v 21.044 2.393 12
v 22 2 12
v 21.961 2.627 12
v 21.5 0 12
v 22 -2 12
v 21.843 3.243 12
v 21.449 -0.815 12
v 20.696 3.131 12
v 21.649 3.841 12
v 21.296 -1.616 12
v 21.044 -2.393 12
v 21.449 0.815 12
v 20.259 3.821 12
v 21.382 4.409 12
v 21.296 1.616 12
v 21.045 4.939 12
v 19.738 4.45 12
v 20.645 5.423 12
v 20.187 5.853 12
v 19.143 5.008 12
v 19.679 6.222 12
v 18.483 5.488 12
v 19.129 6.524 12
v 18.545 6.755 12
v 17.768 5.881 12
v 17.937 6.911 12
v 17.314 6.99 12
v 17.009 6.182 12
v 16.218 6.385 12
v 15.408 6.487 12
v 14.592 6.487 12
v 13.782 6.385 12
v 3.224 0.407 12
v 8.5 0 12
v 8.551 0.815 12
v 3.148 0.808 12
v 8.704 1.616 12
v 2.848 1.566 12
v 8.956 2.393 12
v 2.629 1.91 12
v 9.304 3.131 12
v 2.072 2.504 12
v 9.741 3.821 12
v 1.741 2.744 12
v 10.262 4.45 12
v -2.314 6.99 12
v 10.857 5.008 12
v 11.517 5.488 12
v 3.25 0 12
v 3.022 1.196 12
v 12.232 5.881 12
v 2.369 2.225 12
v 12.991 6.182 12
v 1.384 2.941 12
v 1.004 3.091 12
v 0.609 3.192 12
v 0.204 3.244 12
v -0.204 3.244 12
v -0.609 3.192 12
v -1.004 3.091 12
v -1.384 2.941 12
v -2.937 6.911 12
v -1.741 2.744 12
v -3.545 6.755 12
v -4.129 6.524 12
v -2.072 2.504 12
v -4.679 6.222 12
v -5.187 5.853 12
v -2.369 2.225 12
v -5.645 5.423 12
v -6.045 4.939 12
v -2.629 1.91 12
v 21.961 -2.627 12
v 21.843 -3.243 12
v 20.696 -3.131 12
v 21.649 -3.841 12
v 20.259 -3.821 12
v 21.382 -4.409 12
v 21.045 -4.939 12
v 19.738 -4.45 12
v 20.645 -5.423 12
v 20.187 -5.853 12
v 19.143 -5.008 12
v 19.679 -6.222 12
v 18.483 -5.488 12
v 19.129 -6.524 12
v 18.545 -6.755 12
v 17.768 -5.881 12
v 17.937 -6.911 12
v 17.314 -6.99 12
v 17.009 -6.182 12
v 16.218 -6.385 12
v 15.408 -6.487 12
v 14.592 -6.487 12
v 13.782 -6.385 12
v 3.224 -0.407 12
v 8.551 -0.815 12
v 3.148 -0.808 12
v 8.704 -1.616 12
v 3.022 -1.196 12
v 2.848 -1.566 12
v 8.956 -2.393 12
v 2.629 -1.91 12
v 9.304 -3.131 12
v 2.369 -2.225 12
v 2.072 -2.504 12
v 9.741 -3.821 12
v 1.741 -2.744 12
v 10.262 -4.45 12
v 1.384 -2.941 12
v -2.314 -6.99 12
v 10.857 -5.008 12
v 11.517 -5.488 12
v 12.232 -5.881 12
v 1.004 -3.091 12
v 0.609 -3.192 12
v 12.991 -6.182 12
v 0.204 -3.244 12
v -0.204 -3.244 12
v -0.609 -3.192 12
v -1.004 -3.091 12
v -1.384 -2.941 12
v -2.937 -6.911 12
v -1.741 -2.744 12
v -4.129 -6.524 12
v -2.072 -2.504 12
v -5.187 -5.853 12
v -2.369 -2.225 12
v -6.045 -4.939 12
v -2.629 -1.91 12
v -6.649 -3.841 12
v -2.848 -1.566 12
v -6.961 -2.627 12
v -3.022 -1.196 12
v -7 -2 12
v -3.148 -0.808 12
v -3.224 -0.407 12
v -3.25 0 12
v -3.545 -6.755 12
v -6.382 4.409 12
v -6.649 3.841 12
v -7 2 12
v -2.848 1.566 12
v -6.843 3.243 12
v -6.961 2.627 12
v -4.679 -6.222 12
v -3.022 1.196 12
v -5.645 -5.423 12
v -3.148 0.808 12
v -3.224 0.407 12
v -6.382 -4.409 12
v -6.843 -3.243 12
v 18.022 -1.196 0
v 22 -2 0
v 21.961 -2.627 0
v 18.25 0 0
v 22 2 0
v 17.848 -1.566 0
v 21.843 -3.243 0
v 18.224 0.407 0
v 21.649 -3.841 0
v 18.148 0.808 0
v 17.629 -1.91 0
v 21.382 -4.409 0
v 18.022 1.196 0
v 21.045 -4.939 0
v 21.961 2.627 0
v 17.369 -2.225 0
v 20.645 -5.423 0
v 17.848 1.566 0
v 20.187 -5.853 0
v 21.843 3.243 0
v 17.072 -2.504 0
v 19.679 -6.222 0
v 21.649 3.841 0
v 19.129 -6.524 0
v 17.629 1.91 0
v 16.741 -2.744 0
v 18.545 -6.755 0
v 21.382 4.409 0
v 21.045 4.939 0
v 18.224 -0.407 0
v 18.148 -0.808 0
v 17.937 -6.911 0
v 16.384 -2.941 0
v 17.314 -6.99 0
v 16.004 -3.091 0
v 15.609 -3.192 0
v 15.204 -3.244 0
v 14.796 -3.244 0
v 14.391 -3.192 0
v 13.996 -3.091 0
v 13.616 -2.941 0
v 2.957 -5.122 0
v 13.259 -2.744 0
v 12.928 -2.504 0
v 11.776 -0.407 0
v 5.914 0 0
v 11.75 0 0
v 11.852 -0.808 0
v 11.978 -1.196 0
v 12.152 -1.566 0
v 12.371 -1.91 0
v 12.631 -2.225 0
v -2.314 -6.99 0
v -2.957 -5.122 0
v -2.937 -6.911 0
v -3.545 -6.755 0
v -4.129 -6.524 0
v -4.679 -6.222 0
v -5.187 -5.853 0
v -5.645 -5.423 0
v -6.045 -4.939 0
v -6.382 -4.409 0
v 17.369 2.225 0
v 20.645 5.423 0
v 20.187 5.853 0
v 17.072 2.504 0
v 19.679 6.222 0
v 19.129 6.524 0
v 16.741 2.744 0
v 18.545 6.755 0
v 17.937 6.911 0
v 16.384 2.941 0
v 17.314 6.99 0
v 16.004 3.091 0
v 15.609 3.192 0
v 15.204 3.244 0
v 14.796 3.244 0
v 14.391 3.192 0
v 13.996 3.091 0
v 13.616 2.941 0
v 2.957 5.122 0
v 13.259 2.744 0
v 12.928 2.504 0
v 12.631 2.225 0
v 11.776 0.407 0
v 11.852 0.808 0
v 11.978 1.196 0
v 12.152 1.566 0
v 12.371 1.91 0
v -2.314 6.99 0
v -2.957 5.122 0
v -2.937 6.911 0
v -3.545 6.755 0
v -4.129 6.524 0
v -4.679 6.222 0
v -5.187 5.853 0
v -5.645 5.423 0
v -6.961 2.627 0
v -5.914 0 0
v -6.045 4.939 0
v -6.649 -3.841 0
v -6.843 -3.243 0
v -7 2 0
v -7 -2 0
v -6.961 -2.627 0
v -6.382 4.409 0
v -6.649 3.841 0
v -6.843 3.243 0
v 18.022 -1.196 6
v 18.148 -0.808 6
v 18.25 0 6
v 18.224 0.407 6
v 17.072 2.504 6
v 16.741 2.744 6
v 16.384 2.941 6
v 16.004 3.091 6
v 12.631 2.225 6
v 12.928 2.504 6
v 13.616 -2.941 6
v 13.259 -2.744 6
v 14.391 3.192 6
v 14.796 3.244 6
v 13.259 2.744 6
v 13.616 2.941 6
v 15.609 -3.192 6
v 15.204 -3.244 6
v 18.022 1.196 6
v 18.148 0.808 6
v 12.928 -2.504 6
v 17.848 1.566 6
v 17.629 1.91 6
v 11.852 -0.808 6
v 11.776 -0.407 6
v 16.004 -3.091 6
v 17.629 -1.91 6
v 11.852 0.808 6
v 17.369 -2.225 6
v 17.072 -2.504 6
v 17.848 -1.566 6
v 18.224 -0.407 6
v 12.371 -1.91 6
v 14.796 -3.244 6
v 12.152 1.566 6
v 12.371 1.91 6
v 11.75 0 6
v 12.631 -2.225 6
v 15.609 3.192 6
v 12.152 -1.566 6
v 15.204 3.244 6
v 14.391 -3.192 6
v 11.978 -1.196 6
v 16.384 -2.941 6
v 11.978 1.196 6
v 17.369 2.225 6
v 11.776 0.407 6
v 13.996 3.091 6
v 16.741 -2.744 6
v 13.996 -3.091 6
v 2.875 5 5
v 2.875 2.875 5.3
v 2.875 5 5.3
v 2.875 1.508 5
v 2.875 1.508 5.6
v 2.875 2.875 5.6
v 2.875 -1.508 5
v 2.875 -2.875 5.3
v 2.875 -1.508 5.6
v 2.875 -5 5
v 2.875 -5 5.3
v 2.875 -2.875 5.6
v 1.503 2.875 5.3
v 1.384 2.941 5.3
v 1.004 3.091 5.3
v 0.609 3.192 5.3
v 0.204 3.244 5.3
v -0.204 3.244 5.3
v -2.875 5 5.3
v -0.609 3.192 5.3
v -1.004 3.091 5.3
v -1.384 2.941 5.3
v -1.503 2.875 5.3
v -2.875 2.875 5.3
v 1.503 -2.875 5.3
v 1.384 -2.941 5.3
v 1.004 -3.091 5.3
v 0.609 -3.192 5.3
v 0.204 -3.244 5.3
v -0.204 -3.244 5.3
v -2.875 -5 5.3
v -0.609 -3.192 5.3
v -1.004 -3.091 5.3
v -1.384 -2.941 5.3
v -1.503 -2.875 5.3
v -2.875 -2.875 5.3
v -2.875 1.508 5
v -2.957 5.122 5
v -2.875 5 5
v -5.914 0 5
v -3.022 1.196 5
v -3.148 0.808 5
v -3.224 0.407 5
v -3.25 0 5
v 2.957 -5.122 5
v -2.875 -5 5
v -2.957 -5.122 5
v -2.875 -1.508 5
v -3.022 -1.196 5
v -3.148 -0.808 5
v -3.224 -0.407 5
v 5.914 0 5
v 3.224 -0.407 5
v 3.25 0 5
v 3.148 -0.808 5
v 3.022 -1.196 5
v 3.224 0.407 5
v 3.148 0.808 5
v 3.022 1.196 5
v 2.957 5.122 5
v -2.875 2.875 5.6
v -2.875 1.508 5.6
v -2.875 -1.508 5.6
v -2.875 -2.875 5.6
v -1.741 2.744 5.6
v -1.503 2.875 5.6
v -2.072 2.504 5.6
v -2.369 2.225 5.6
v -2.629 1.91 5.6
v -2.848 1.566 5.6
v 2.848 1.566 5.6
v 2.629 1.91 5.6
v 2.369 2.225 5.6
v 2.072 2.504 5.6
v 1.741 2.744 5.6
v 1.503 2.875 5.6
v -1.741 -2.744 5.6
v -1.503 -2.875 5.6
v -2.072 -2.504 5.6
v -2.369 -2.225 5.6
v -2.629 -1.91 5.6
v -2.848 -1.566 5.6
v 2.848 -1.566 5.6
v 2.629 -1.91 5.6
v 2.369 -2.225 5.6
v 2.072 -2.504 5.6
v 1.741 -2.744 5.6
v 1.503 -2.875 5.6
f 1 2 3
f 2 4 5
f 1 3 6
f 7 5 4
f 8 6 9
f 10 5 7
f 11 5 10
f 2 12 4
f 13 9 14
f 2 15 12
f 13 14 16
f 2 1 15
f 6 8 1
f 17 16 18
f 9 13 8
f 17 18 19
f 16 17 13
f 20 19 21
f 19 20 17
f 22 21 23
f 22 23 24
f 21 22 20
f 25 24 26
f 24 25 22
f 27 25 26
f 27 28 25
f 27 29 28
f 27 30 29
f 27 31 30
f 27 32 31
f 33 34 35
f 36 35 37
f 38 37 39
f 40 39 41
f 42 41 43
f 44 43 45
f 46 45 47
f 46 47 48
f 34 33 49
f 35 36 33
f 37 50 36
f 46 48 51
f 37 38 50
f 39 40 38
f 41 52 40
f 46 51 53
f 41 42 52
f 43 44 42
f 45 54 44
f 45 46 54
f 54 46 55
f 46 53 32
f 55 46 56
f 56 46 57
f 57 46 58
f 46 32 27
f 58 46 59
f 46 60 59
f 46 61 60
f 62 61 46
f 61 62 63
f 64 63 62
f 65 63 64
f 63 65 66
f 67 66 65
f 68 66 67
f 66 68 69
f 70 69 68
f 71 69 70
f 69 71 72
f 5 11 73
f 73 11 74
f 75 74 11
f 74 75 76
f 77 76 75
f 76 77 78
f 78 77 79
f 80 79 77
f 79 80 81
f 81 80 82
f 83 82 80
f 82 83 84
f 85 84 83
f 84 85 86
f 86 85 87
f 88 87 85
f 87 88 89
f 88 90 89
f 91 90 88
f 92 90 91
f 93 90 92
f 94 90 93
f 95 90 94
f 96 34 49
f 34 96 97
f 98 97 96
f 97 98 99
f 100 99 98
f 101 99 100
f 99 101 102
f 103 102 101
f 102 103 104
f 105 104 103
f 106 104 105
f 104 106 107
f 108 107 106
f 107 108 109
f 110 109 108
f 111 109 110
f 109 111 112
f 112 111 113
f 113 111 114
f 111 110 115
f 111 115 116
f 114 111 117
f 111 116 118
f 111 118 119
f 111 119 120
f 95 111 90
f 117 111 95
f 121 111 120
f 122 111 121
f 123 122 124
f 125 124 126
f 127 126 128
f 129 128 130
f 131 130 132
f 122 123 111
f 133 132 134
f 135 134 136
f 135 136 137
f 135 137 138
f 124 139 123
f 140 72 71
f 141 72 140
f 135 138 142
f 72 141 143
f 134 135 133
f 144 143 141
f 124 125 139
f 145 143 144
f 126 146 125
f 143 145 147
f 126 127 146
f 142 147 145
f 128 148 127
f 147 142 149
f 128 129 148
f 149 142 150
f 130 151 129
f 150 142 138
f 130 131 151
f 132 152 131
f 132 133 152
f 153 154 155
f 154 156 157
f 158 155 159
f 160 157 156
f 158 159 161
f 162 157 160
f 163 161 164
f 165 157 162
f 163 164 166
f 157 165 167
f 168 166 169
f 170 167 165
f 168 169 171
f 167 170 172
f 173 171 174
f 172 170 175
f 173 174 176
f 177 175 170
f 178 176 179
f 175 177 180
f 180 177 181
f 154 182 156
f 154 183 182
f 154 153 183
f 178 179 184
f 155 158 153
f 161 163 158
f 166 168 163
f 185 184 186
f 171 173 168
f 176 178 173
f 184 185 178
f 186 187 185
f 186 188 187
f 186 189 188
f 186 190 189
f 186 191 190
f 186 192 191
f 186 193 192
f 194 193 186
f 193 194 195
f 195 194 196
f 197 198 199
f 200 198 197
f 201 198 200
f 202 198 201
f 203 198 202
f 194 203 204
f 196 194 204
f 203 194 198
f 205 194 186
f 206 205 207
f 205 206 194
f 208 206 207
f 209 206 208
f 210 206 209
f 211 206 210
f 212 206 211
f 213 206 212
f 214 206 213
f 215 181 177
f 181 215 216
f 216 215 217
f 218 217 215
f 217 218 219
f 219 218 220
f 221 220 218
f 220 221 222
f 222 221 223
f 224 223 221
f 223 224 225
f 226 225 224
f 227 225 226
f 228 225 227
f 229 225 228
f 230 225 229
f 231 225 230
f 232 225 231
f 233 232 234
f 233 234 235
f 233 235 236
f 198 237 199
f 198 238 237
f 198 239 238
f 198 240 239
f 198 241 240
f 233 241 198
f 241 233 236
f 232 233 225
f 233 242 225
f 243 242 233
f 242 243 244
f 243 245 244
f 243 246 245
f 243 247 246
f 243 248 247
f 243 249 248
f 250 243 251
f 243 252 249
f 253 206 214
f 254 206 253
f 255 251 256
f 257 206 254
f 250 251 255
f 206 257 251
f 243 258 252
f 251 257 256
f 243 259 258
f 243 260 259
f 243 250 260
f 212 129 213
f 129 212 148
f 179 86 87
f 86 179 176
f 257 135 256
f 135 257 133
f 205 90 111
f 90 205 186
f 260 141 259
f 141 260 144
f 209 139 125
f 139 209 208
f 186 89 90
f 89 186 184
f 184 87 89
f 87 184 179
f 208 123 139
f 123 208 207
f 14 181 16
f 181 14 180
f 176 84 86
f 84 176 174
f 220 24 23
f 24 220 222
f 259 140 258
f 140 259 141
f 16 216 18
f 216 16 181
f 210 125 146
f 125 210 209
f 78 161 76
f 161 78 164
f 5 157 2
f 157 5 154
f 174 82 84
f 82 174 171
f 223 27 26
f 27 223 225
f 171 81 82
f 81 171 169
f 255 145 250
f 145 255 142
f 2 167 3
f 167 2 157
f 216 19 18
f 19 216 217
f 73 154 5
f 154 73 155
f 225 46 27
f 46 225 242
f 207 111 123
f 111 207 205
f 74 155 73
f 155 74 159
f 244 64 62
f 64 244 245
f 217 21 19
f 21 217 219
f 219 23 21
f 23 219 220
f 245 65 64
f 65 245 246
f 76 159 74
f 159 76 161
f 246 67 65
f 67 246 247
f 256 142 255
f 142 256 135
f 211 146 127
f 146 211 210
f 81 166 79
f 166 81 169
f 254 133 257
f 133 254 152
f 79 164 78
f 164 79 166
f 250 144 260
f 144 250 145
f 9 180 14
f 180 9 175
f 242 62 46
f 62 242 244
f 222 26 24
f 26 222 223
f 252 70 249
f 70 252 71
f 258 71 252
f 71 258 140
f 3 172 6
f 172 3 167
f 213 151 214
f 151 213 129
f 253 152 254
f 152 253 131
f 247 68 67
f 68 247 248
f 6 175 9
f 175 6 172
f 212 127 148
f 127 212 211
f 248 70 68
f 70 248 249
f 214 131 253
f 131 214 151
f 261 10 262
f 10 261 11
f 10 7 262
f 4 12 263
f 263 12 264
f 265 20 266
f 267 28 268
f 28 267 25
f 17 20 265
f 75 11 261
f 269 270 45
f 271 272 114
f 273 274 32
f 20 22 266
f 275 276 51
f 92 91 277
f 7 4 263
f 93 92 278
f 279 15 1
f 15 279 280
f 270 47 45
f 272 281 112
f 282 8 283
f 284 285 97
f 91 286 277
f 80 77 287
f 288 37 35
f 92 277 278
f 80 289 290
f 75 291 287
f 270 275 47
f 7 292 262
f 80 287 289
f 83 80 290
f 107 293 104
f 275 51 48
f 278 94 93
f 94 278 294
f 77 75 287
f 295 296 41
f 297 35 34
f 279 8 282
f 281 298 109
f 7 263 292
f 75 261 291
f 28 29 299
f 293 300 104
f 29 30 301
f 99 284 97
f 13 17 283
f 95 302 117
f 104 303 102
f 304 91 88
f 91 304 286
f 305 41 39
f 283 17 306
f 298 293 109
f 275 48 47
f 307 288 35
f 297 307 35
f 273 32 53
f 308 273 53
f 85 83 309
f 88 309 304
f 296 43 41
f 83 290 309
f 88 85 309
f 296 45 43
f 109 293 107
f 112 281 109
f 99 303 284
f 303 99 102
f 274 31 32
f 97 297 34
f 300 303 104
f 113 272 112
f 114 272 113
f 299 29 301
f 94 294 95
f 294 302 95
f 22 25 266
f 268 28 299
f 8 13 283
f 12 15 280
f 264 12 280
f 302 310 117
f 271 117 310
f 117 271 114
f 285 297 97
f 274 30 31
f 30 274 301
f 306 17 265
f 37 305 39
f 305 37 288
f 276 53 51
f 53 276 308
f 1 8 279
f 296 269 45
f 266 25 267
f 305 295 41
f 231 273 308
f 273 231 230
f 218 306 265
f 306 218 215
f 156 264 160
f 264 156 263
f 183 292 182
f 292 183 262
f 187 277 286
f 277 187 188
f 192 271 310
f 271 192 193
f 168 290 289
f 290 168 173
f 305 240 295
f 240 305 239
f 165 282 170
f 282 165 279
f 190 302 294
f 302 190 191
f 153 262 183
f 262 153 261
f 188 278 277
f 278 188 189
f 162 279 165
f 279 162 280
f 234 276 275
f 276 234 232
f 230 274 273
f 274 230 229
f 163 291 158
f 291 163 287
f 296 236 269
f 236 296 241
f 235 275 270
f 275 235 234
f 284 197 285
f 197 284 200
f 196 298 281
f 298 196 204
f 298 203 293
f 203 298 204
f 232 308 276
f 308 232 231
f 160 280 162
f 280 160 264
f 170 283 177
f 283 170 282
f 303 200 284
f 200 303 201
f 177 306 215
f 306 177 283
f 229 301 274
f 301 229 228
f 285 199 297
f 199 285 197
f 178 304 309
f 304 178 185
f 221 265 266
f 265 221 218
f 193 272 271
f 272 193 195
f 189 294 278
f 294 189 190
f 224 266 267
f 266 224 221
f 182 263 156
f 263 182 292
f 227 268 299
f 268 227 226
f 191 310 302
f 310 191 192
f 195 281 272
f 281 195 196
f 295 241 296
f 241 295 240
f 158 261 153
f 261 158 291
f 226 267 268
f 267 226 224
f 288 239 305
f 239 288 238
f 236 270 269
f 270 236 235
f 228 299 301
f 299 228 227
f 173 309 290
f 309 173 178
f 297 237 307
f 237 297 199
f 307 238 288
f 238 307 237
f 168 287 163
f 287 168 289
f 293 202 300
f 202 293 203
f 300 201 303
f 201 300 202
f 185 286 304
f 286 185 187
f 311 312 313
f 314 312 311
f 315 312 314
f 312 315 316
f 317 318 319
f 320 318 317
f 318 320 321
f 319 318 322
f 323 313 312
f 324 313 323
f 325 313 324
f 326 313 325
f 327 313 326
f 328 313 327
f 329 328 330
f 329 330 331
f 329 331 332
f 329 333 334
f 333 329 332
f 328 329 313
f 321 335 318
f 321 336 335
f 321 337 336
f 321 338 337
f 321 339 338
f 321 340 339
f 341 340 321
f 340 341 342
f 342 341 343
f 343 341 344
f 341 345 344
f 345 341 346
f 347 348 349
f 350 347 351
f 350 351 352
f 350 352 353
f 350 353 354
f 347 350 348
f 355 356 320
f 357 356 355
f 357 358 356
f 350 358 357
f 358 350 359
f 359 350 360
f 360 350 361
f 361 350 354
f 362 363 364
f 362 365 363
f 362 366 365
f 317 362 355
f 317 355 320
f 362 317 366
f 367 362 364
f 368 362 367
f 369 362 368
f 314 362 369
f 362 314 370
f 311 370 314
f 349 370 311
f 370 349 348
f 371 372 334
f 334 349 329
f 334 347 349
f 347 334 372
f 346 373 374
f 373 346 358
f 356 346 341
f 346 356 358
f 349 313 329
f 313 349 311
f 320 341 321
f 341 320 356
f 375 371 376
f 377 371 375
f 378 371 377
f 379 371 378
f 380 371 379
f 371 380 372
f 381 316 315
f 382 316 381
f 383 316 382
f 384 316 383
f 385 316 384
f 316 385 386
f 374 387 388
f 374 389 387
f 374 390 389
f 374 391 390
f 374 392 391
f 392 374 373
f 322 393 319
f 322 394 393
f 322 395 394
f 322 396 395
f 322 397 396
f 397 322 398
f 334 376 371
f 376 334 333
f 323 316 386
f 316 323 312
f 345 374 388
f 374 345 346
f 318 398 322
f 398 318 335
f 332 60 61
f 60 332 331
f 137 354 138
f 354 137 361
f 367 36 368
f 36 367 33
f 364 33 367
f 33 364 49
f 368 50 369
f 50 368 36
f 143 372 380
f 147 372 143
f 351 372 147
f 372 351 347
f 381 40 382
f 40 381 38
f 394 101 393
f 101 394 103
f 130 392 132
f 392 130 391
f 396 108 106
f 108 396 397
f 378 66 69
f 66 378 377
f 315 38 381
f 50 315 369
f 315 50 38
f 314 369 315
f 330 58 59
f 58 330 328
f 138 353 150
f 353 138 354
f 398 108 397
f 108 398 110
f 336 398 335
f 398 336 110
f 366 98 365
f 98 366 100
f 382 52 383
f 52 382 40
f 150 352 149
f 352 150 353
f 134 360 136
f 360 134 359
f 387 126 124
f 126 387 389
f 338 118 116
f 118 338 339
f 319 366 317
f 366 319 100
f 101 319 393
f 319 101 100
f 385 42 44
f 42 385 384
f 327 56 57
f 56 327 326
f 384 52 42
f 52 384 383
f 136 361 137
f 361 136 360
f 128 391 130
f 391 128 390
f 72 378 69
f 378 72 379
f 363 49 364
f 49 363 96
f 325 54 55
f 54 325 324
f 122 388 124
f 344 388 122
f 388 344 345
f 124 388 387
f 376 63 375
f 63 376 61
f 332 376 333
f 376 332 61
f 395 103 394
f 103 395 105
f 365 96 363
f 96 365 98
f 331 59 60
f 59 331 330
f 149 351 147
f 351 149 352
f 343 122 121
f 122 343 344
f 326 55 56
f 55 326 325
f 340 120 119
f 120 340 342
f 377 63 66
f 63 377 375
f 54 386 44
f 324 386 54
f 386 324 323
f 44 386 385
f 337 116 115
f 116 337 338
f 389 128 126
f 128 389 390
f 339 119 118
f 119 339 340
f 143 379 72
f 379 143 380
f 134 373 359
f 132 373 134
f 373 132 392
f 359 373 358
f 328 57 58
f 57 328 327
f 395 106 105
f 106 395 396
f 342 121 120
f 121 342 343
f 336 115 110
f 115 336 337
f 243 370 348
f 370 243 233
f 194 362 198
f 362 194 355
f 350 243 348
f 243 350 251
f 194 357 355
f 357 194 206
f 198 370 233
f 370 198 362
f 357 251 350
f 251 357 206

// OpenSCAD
$fn = 50;


difference() {
	union() {
		cylinder(h = 12, r = 7.0000000000);
		translate(v = [7.5000000000, 0.0000000000, 0]) {
			hull() {
				translate(v = [-9.5000000000, 2.0000000000, 0]) {
					cylinder(h = 12, r = 5);
				}
				translate(v = [9.5000000000, 2.0000000000, 0]) {
					cylinder(h = 12, r = 5);
				}
				translate(v = [-9.5000000000, -2.0000000000, 0]) {
					cylinder(h = 12, r = 5);
				}
				translate(v = [9.5000000000, -2.0000000000, 0]) {
					cylinder(h = 12, r = 5);
				}
			}
		}
		translate(v = [7.5000000000, 0.0000000000, 0]) {
			hull() {
				translate(v = [-9.5000000000, 2.0000000000, 0]) {
					cylinder(h = 12, r = 5);
				}
				translate(v = [9.5000000000, 2.0000000000, 0]) {
					cylinder(h = 12, r = 5);
				}
				translate(v = [-9.5000000000, -2.0000000000, 0]) {
					cylinder(h = 12, r = 5);
				}
				translate(v = [9.5000000000, -2.0000000000, 0]) {
					cylinder(h = 12, r = 5);
				}
			}
		}
	}
	union() {
		translate(v = [15.0000000000, 0.0000000000, 12]) {
			rotate(a = [0, 0, 0]) {
				difference() {
					union() {
						#translate(v = [0, 0, -12.0000000000]) {
							cylinder(h = 12, r = 2.2500000000);
						}
						#translate(v = [0, 0, -6]) {
							cylinder(h = 6, r1 = 3.2500000000, r2 = 6.5000000000);
						}
						#translate(v = [0, 0, -12.0000000000]) {
							cylinder(h = 12, r = 3.2500000000);
						}
						#translate(v = [0, 0, -12.0000000000]) {
							cylinder(h = 12, r = 2.2500000000);
						}
					}
					union();
				}
			}
		}
		translate(v = [15.0000000000, 0.0000000000, 12]) {
			rotate(a = [0, 0, 0]) {
				difference() {
					union() {
						#translate(v = [0, 0, -12.0000000000]) {
							cylinder(h = 12, r = 2.2500000000);
						}
						#translate(v = [0, 0, -6]) {
							cylinder(h = 6, r1 = 3.2500000000, r2 = 6.5000000000);
						}
						#translate(v = [0, 0, -12.0000000000]) {
							cylinder(h = 12, r = 3.2500000000);
						}
						#translate(v = [0, 0, -12.0000000000]) {
							cylinder(h = 12, r = 2.2500000000);
						}
					}
					union();
				}
			}
		}
		translate(v = [0.0000000000, 0.0000000000, 0]) {
			rotate(a = [0, 0, 0]) {
				difference() {
					union() {
						#translate(v = [-2.8750000000, -5.0000000000, -0.3000000000]) {
							cube(size = [5.7500000000, 10, 0.3000000000]);
						}
						#translate(v = [-2.8750000000, -2.8750000000, -0.6000000000]) {
							cube(size = [5.7500000000, 5.7500000000, 0.3000000000]);
						}
						#translate(v = [-2.8750000000, -5.0000000000, 5]) {
							cube(size = [5.7500000000, 10, 0.3000000000]);
						}
						#translate(v = [-2.8750000000, -2.8750000000, 5.3000000000]) {
							cube(size = [5.7500000000, 5.7500000000, 0.3000000000]);
						}
						#translate(v = [0, 0, -100.0000000000]) {
							cylinder(h = 200, r = 3.2500000000);
						}
						#linear_extrude(height = 5) {
							polygon(points = [[5.9142500000, 0.0000000000], [2.9571250000, 5.1218907443], [-2.9571250000, 5.1218907443], [-5.9142500000, 0.0000000000], [-2.9571250000, -5.1218907443], [2.9571250000, -5.1218907443]]);
						}
						#translate(v = [-2.8750000000, -5.0000000000, -0.3000000000]) {
							cube(size = [5.7500000000, 10, 0.3000000000]);
						}
						#translate(v = [-2.8750000000, -2.8750000000, -0.6000000000]) {
							cube(size = [5.7500000000, 5.7500000000, 0.3000000000]);
						}
						#translate(v = [-2.8750000000, -5.0000000000, 5]) {
							cube(size = [5.7500000000, 10, 0.3000000000]);
						}
						#translate(v = [-2.8750000000, -2.8750000000, 5.3000000000]) {
							cube(size = [5.7500000000, 5.7500000000, 0.3000000000]);
						}
						#translate(v = [0, 0, -100.0000000000]) {
							cylinder(h = 200, r = 3.2500000000);
						}
						#translate(v = [-2.8750000000, -5.0000000000, -0.3000000000]) {
							cube(size = [5.7500000000, 10, 0.3000000000]);
						}
						#translate(v = [-2.8750000000, -2.8750000000, -0.6000000000]) {
							cube(size = [5.7500000000, 5.7500000000, 0.3000000000]);
						}
						#translate(v = [-2.8750000000, -5.0000000000, 5]) {
							cube(size = [5.7500000000, 10, 0.3000000000]);
						}
						#translate(v = [-2.8750000000, -2.8750000000, 5.3000000000]) {
							cube(size = [5.7500000000, 5.7500000000, 0.3000000000]);
						}
						#translate(v = [0, 0, -100.0000000000]) {
							cylinder(h = 200, r = 3.2500000000);
						}
					}
					union();
				}
			}
		}
		translate(v = [0, 0, -100]) {
			cylinder(h = 200, r = 3.2500000000);
		}
		translate(v = [0, 0, -100]) {
			cylinder(h = 200, r = 1.8000000000);
		}
	}
}
